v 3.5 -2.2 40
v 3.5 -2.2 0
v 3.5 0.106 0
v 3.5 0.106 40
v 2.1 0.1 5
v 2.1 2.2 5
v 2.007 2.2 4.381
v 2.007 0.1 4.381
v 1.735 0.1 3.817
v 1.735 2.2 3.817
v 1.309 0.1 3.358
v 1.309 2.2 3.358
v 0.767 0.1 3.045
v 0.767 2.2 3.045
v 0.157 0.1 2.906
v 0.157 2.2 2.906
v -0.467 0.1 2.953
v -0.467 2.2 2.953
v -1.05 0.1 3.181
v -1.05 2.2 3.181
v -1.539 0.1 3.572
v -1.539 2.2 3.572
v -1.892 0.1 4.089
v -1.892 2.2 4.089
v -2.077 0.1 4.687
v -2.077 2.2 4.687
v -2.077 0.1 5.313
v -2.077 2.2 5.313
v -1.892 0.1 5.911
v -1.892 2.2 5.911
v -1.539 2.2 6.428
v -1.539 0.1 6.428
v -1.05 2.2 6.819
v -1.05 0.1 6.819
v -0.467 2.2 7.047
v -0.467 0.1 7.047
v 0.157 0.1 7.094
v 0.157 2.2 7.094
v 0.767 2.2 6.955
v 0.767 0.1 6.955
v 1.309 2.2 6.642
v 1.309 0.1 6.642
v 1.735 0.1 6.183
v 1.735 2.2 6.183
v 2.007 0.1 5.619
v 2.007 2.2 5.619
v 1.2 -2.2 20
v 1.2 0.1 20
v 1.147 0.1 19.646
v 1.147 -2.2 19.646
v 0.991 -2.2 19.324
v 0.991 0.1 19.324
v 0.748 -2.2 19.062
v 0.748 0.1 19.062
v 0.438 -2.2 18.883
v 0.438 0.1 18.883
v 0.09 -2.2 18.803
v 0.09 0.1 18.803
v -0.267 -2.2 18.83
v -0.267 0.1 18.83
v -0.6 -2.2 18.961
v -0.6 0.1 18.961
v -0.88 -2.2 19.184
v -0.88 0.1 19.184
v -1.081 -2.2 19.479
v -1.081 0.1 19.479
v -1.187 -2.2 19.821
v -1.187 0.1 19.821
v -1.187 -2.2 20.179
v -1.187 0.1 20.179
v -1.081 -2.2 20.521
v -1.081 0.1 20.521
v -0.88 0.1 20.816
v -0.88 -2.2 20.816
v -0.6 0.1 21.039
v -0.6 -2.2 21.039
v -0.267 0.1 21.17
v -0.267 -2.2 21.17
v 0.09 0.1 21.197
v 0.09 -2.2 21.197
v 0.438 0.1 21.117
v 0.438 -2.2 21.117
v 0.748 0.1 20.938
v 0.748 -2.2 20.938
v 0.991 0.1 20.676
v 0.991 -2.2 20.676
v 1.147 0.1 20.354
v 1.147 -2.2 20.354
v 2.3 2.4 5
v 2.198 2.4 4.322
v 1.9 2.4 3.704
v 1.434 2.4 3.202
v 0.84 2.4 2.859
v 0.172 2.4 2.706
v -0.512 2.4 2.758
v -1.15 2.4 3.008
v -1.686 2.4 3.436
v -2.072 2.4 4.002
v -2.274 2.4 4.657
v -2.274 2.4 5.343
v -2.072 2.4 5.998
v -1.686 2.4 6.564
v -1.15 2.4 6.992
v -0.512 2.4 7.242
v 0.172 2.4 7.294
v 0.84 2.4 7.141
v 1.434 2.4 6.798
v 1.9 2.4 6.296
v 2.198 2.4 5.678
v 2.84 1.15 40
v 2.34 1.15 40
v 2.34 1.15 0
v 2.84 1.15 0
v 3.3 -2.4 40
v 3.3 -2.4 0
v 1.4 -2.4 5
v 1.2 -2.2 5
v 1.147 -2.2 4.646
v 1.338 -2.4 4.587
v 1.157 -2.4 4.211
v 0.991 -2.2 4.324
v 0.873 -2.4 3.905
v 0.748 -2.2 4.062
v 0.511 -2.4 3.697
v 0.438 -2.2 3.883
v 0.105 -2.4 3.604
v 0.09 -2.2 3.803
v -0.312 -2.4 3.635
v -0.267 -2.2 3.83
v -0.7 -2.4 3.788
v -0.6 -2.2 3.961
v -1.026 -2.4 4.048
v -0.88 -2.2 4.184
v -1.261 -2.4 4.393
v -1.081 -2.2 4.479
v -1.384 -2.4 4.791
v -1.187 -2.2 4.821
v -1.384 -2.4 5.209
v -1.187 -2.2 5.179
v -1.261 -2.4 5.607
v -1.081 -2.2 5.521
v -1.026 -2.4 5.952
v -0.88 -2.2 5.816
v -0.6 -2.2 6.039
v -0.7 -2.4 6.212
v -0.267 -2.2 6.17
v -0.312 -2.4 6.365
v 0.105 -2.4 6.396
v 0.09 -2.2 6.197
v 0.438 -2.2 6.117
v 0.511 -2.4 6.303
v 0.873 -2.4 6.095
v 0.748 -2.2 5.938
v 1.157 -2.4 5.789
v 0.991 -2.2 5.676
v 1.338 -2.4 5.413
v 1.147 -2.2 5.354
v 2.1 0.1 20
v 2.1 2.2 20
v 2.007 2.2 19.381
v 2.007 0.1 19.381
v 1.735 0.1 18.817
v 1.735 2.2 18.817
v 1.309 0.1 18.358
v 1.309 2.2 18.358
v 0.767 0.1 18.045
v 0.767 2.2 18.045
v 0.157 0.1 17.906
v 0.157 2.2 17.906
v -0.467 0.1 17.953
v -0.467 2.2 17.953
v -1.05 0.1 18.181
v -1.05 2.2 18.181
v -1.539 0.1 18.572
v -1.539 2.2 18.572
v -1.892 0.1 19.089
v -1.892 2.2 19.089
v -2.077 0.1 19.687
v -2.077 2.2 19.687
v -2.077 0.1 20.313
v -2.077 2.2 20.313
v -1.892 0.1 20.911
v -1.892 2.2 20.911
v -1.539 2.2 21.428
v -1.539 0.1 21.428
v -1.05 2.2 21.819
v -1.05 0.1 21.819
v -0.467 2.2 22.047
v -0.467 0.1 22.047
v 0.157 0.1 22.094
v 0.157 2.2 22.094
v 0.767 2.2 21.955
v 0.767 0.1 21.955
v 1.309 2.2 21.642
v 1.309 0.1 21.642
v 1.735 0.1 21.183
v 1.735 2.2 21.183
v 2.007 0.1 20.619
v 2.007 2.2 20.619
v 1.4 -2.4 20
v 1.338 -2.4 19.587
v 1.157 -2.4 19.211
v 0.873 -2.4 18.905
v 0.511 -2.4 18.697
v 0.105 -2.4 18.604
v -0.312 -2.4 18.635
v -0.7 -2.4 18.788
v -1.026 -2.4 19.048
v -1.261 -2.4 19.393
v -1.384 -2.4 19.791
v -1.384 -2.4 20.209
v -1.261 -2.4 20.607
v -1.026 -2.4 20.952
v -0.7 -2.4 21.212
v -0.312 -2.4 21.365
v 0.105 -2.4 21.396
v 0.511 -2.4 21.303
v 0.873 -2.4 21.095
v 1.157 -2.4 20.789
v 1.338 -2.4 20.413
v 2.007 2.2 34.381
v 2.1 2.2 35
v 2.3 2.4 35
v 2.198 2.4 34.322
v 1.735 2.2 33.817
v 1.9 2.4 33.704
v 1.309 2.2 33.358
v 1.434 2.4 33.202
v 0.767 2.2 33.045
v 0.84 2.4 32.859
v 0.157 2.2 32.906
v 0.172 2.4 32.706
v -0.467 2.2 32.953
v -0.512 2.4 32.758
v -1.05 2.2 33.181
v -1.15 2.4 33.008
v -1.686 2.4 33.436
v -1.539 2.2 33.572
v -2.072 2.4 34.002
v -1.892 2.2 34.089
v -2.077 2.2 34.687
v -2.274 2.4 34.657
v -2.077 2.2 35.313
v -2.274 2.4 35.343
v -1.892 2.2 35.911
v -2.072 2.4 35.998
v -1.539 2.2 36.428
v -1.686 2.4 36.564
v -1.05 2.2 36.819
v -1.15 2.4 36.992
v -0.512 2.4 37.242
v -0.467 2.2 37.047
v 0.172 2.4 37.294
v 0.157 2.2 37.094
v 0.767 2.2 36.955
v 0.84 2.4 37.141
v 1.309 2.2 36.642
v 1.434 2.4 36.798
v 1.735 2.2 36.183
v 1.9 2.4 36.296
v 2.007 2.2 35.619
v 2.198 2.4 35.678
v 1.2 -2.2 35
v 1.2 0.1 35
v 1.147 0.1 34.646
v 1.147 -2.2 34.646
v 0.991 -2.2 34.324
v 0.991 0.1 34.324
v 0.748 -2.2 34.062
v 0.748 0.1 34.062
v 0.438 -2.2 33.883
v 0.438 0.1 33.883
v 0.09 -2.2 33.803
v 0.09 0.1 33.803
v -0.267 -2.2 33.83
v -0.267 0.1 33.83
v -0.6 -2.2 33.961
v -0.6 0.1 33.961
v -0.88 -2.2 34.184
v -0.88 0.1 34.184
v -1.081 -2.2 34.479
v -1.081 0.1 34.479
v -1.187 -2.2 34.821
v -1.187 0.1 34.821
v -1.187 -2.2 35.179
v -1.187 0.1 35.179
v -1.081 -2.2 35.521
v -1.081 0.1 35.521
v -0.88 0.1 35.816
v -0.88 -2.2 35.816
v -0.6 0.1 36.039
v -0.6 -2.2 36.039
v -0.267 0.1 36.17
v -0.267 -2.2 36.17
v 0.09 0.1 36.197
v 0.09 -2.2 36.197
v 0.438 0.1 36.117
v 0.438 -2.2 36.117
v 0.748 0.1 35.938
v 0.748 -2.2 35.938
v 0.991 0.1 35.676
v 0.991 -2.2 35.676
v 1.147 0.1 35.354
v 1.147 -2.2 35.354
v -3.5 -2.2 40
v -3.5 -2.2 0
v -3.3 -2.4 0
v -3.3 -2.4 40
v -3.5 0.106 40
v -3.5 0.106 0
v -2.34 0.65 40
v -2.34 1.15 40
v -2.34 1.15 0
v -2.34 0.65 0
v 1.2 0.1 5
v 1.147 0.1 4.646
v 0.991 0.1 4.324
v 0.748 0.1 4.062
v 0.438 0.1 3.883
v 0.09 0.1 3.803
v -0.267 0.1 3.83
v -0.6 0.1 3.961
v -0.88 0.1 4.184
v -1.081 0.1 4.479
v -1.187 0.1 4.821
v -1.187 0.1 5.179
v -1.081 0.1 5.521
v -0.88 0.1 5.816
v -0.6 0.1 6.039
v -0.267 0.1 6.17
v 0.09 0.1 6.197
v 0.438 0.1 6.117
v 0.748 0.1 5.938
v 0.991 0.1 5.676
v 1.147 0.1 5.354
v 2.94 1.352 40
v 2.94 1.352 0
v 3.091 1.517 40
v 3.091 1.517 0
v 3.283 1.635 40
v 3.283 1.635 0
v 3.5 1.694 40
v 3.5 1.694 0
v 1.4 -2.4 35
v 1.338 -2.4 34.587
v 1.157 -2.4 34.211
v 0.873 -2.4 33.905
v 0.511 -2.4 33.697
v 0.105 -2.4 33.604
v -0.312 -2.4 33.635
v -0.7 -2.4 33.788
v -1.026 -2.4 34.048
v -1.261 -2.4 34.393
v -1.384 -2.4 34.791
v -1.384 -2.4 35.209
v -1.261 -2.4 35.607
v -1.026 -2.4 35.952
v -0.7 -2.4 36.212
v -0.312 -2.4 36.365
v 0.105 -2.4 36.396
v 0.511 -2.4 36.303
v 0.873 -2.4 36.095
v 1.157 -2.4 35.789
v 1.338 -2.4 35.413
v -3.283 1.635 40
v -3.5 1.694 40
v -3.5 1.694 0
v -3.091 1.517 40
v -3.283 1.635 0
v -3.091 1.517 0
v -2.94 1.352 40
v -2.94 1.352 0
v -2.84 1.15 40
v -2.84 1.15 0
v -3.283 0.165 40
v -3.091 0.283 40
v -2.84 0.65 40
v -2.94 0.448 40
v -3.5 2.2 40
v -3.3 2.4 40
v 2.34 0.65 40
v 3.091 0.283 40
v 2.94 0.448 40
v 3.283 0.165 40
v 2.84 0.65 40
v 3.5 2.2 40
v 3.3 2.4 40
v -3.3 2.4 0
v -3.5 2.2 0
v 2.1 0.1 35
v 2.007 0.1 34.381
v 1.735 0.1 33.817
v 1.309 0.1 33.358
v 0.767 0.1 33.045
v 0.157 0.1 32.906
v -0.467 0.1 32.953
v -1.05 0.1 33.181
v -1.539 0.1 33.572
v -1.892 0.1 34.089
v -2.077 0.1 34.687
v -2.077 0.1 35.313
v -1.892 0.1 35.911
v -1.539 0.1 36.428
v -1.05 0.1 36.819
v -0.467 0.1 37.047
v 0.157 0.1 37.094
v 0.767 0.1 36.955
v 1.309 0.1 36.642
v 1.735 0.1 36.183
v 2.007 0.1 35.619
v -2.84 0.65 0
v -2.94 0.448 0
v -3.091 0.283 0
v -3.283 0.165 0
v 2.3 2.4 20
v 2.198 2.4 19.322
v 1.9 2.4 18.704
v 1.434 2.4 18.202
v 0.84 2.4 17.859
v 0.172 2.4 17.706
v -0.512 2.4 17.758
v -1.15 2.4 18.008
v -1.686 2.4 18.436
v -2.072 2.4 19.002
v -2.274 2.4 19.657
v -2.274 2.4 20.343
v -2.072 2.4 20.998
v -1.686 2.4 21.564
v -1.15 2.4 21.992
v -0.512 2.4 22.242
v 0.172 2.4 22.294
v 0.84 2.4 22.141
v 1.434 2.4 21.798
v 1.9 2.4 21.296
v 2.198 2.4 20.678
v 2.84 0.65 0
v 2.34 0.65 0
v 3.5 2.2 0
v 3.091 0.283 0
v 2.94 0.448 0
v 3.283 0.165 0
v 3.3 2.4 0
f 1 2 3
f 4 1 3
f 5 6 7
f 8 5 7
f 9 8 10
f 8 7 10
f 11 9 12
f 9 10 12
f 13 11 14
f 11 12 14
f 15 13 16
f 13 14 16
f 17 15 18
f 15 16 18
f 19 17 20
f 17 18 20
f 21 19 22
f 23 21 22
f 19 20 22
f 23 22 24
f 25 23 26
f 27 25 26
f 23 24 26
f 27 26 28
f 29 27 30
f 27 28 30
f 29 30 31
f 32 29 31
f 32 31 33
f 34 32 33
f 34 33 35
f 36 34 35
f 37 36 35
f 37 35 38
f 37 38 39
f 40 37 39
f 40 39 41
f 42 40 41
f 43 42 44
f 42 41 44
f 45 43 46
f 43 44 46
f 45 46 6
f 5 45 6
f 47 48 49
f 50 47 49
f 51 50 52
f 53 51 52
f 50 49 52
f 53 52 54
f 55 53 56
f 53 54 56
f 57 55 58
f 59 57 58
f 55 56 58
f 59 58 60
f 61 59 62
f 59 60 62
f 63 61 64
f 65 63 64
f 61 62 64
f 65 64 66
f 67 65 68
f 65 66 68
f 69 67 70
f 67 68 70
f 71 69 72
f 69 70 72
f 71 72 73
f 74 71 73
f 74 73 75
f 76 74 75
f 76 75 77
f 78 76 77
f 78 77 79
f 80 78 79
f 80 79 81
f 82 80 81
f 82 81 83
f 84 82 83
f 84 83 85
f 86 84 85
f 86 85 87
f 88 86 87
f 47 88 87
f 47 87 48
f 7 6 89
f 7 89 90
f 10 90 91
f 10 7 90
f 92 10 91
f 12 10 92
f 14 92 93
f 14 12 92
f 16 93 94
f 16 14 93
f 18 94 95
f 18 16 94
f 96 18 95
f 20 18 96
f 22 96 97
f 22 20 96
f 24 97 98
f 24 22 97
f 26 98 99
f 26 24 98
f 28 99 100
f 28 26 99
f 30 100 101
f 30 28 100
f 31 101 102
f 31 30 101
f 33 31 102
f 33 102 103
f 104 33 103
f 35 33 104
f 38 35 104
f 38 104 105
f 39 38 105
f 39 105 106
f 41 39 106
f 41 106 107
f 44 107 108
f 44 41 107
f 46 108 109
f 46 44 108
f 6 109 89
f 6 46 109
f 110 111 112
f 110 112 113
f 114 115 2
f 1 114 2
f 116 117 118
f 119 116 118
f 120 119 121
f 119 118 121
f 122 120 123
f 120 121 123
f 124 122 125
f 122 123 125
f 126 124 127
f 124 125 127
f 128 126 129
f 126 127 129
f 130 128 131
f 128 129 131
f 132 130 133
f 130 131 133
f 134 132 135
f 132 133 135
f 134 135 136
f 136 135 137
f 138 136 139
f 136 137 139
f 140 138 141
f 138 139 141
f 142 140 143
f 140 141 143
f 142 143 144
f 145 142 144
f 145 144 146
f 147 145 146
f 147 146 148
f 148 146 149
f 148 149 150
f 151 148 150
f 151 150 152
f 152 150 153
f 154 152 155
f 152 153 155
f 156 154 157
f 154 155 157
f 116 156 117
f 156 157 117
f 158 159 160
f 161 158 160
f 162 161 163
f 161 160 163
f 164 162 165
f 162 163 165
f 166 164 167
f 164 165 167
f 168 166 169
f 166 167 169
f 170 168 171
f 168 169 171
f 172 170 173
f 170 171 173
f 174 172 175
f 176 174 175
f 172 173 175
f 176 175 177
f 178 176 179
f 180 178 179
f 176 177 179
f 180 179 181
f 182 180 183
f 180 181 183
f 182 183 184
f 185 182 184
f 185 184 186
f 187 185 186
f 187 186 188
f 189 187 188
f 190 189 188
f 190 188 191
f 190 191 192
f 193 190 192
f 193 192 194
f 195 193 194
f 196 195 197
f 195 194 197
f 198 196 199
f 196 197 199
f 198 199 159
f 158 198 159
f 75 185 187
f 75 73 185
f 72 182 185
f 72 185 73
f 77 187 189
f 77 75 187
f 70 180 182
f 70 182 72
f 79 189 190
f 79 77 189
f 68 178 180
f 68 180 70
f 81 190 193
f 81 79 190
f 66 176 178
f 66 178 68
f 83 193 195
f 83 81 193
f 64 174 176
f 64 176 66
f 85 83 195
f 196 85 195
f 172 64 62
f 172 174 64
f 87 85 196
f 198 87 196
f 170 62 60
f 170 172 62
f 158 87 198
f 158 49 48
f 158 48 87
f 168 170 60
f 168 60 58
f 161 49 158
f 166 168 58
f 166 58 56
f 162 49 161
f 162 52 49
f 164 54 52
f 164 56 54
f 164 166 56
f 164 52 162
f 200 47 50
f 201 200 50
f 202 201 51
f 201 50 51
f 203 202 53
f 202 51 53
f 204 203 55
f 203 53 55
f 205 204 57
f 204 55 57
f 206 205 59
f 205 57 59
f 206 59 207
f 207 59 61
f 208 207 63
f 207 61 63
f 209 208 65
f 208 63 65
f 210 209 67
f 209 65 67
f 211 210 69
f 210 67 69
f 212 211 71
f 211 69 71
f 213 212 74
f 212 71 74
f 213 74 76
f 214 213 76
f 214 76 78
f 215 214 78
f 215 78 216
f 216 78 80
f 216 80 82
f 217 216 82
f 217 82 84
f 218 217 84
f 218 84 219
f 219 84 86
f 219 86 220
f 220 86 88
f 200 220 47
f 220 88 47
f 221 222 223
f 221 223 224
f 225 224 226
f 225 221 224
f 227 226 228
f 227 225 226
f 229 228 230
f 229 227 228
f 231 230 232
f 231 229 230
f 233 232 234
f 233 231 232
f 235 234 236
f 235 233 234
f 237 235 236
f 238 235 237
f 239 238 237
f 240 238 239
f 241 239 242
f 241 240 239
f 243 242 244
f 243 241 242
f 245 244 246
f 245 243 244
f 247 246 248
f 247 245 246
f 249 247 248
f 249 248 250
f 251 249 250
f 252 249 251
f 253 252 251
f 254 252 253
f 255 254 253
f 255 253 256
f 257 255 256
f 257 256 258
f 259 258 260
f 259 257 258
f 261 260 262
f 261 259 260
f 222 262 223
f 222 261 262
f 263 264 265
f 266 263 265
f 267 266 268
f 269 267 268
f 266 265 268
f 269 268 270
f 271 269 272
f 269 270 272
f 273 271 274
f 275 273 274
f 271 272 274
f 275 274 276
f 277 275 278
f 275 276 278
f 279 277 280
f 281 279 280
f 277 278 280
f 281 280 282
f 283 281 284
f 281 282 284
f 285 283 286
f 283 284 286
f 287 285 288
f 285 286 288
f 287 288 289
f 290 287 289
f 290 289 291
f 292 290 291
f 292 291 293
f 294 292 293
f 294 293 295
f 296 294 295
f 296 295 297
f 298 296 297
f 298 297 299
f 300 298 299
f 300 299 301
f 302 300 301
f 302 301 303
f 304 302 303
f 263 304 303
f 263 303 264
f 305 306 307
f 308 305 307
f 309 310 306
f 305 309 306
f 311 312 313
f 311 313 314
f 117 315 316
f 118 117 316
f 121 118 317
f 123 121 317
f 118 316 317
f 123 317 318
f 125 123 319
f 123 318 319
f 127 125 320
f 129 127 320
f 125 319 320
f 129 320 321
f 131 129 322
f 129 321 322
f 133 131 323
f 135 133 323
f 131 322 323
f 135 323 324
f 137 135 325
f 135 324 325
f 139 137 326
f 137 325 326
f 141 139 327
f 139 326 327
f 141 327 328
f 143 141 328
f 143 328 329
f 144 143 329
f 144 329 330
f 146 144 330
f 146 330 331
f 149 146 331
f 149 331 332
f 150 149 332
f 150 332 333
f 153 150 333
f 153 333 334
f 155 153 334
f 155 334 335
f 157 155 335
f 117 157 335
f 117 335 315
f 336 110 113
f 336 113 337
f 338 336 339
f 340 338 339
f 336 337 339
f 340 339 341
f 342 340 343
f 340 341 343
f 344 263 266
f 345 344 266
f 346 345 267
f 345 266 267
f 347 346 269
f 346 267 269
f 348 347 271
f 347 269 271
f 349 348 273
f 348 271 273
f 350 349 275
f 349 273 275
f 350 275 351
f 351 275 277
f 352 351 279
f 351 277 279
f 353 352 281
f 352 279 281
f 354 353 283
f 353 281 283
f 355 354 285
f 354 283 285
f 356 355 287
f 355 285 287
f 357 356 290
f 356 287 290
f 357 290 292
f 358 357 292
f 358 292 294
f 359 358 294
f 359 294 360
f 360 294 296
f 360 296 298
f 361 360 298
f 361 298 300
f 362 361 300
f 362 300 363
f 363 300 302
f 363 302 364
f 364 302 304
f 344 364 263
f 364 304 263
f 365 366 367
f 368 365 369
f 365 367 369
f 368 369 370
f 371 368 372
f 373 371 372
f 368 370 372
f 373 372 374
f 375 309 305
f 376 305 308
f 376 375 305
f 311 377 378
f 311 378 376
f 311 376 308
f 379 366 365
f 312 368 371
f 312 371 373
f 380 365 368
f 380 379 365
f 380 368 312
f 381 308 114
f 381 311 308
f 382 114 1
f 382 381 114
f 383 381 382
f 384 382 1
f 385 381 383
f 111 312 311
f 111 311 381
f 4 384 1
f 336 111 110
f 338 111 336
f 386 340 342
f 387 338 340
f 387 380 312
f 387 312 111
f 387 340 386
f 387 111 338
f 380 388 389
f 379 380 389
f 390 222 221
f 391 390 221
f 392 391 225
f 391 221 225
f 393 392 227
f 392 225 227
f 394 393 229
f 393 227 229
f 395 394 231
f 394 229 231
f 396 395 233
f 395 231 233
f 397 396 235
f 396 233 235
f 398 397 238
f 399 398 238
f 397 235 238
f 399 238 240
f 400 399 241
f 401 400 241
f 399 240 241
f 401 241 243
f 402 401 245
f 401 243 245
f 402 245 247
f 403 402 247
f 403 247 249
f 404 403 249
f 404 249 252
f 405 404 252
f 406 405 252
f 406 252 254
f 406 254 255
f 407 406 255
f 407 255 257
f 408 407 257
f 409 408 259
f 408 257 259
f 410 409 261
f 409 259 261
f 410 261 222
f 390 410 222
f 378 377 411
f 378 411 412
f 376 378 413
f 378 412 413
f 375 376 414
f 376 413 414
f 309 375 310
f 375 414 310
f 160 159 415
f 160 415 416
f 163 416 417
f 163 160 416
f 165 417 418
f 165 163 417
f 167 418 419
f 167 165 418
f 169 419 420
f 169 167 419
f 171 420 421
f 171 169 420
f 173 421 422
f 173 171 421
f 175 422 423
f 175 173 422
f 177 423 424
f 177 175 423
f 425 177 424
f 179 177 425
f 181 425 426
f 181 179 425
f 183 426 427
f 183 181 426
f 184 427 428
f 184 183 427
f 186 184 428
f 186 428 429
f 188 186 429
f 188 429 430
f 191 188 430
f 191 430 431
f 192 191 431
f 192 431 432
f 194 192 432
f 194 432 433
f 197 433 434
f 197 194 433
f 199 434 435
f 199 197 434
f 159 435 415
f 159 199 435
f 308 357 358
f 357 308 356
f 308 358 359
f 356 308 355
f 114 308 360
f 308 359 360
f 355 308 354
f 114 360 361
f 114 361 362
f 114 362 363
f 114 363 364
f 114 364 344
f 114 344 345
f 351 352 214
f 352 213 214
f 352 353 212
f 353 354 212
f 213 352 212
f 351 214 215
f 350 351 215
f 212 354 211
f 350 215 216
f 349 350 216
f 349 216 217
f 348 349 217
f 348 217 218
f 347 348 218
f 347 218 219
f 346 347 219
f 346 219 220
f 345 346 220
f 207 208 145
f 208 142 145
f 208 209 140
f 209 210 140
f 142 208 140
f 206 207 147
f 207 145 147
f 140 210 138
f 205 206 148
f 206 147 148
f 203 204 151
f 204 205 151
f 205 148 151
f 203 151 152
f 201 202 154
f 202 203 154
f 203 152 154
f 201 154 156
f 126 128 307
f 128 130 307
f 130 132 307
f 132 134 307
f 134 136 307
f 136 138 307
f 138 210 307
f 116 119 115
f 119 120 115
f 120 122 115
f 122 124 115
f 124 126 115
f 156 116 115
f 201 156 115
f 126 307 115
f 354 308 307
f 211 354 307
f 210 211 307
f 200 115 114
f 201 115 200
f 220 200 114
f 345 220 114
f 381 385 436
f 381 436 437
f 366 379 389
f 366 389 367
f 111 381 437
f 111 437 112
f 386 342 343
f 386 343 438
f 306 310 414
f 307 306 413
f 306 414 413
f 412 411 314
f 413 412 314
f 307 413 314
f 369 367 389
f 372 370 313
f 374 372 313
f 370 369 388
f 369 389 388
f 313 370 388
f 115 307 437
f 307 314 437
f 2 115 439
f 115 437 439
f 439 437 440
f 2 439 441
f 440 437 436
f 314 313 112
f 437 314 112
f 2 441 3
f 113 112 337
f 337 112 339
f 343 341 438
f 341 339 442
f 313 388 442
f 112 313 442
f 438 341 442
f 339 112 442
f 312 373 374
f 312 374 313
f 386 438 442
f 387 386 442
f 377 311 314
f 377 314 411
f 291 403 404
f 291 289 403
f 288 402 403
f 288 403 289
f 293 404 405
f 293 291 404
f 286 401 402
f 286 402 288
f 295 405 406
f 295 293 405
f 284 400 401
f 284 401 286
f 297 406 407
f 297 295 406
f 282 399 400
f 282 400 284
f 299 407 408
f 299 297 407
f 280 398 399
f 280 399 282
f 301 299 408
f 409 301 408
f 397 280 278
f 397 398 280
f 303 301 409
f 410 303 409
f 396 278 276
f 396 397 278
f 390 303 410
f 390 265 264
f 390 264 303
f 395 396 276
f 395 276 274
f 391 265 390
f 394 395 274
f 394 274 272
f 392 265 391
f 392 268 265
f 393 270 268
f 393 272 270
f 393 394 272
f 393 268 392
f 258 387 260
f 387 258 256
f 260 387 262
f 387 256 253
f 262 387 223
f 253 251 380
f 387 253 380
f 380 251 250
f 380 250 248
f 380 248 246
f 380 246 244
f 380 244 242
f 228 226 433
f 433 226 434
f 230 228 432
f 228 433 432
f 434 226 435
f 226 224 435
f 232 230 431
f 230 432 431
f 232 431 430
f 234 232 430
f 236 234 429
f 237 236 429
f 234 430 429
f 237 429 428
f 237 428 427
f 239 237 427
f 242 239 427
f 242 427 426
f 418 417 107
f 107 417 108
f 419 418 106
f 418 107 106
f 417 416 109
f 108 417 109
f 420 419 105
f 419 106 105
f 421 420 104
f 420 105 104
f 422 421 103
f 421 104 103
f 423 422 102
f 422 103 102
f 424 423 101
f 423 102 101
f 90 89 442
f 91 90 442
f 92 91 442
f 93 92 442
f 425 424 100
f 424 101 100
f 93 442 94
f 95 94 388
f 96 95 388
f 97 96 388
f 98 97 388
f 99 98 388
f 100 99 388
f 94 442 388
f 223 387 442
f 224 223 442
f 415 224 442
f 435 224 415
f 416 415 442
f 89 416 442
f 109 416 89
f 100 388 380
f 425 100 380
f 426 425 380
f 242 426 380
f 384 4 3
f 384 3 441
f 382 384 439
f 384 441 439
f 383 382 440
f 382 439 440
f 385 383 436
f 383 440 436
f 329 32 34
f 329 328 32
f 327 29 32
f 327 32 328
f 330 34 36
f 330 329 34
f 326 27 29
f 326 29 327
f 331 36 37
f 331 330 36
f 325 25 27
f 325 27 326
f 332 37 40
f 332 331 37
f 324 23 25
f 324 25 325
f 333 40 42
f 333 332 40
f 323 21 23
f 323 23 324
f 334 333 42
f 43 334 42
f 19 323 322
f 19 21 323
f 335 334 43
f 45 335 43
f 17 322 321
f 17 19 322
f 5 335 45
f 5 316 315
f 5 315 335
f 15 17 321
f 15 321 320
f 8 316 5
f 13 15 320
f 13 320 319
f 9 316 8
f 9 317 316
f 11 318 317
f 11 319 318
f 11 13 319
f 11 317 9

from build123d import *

# Parameters (mm, degrees)
EXTRUDE1_DEPTH             = 40
EXTRUDE2_REACH             = 42.439
SKETCH2_R                  = 1.2
SKETCH_R                   = 2.1
SKETCH_R_2                 = 1.2
EXTRUDE4_DEPTH             = 2.3
CHAMFER1_SIZE              = 0.2
LPATTERN1_COUNT            = 3
LPATTERN1_PITCH            = 15
CHAMFER1_OF_LPATTERN1_SIZE = 0.2


with BuildPart() as part:
    # Sketch1 → Extrude1 (new body)
    with BuildSketch(Plane.XY):
        with BuildLine():
            Line((-3.3, -2.4), (3.3, -2.4))
            Line((3.3, -2.4), (3.5, -2.2))
            Line((3.5, -2.2), (3.5, 0.106274607))
            ThreePointArc((3.5, 0.106274607), (3.091294745, 0.282570681), (2.840065792, 0.65))
            Line((2.840065792, 0.65), (2.340065792, 0.65))
            Line((2.340065792, 0.65), (2.340065792, 1.15))
            Line((2.340065792, 1.15), (2.840065792, 1.15))
            ThreePointArc((2.840065792, 1.15), (3.091294745, 1.517429319), (3.5, 1.693725393))
            Line((3.5, 1.693725393), (3.5, 2.2))
            Line((3.5, 2.2), (3.3, 2.4))
            Line((3.3, 2.4), (-3.3, 2.4))
            Line((-3.3, 2.4), (-3.5, 2.2))
            Line((-3.5, 2.2), (-3.5, 1.693725393))
            ThreePointArc((-3.5, 1.693725393), (-3.091294745, 1.517429319), (-2.840065792, 1.15))
            Line((-2.840065792, 1.15), (-2.340065792, 1.15))
            Line((-2.340065792, 1.15), (-2.340065792, 0.65))
            Line((-2.340065792, 0.65), (-2.840065792, 0.65))
            ThreePointArc((-2.840065792, 0.65), (-3.091294745, 0.282570681), (-3.5, 0.106274607))
            Line((-3.5, 0.106274607), (-3.5, -2.2))
            Line((-3.5, -2.2), (-3.3, -2.4))
        make_face()
    extrude(amount=EXTRUDE1_DEPTH)

    # Sketch2 → Extrude2 (cut, up to next)
    with BuildSketch(Plane(origin=(0, 2.4, 0), x_dir=(1, 0, 0), z_dir=(0, 1, 0)), mode=Mode.PRIVATE) as extrude2_sk1:
        with Locations((0, -5)):
            Circle(SKETCH2_R)
    extrude2_tool1 = extrude(extrude2_sk1.sketch, amount=-EXTRUDE2_REACH, mode=Mode.PRIVATE) & part.part
    extrude2 = extrude2_tool1.solids().sort_by_distance((0, 2.4, 5))[0]
    add(extrude2, mode=Mode.SUBTRACT)

    # Sketch → Extrude4 (cut)
    with BuildSketch(Plane(origin=(0, 2.4, 0), x_dir=(1, 0, 0), z_dir=(0, 1, 0))):
        with Locations((0, -5)):
            Circle(SKETCH_R)
        with Locations((0, -5)):
            Circle(SKETCH_R_2, mode=Mode.SUBTRACT)
    extrude4 = extrude(amount=-EXTRUDE4_DEPTH, mode=Mode.SUBTRACT)

    # Chamfer1
    chamfer1_edges = [part.edges().sort_by_distance(p)[0] for p in [
        (-1.2, -2.4, 5),
        (-2.1, 2.4, 5),
    ]]
    chamfer(chamfer1_edges, length=CHAMFER1_SIZE)

    # LPattern1: Extrude2, Extrude4 ×3
    with Locations(*[(0, 0, i * LPATTERN1_PITCH) for i in range(1, LPATTERN1_COUNT)]):
        add(extrude2, mode=Mode.SUBTRACT)
        add(extrude4, mode=Mode.SUBTRACT)

    # Chamfer1 of LPattern1
    chamfer1_of_lpattern1_edges = [part.edges().sort_by_distance(p)[0] for p in [
        (-1.2, -2.4, 20),
        (-2.1, 2.4, 20),
        (-1.2, -2.4, 35),
        (-2.1, 2.4, 35),
    ]]
    chamfer(chamfer1_of_lpattern1_edges, length=CHAMFER1_OF_LPATTERN1_SIZE)


solid = part.part
